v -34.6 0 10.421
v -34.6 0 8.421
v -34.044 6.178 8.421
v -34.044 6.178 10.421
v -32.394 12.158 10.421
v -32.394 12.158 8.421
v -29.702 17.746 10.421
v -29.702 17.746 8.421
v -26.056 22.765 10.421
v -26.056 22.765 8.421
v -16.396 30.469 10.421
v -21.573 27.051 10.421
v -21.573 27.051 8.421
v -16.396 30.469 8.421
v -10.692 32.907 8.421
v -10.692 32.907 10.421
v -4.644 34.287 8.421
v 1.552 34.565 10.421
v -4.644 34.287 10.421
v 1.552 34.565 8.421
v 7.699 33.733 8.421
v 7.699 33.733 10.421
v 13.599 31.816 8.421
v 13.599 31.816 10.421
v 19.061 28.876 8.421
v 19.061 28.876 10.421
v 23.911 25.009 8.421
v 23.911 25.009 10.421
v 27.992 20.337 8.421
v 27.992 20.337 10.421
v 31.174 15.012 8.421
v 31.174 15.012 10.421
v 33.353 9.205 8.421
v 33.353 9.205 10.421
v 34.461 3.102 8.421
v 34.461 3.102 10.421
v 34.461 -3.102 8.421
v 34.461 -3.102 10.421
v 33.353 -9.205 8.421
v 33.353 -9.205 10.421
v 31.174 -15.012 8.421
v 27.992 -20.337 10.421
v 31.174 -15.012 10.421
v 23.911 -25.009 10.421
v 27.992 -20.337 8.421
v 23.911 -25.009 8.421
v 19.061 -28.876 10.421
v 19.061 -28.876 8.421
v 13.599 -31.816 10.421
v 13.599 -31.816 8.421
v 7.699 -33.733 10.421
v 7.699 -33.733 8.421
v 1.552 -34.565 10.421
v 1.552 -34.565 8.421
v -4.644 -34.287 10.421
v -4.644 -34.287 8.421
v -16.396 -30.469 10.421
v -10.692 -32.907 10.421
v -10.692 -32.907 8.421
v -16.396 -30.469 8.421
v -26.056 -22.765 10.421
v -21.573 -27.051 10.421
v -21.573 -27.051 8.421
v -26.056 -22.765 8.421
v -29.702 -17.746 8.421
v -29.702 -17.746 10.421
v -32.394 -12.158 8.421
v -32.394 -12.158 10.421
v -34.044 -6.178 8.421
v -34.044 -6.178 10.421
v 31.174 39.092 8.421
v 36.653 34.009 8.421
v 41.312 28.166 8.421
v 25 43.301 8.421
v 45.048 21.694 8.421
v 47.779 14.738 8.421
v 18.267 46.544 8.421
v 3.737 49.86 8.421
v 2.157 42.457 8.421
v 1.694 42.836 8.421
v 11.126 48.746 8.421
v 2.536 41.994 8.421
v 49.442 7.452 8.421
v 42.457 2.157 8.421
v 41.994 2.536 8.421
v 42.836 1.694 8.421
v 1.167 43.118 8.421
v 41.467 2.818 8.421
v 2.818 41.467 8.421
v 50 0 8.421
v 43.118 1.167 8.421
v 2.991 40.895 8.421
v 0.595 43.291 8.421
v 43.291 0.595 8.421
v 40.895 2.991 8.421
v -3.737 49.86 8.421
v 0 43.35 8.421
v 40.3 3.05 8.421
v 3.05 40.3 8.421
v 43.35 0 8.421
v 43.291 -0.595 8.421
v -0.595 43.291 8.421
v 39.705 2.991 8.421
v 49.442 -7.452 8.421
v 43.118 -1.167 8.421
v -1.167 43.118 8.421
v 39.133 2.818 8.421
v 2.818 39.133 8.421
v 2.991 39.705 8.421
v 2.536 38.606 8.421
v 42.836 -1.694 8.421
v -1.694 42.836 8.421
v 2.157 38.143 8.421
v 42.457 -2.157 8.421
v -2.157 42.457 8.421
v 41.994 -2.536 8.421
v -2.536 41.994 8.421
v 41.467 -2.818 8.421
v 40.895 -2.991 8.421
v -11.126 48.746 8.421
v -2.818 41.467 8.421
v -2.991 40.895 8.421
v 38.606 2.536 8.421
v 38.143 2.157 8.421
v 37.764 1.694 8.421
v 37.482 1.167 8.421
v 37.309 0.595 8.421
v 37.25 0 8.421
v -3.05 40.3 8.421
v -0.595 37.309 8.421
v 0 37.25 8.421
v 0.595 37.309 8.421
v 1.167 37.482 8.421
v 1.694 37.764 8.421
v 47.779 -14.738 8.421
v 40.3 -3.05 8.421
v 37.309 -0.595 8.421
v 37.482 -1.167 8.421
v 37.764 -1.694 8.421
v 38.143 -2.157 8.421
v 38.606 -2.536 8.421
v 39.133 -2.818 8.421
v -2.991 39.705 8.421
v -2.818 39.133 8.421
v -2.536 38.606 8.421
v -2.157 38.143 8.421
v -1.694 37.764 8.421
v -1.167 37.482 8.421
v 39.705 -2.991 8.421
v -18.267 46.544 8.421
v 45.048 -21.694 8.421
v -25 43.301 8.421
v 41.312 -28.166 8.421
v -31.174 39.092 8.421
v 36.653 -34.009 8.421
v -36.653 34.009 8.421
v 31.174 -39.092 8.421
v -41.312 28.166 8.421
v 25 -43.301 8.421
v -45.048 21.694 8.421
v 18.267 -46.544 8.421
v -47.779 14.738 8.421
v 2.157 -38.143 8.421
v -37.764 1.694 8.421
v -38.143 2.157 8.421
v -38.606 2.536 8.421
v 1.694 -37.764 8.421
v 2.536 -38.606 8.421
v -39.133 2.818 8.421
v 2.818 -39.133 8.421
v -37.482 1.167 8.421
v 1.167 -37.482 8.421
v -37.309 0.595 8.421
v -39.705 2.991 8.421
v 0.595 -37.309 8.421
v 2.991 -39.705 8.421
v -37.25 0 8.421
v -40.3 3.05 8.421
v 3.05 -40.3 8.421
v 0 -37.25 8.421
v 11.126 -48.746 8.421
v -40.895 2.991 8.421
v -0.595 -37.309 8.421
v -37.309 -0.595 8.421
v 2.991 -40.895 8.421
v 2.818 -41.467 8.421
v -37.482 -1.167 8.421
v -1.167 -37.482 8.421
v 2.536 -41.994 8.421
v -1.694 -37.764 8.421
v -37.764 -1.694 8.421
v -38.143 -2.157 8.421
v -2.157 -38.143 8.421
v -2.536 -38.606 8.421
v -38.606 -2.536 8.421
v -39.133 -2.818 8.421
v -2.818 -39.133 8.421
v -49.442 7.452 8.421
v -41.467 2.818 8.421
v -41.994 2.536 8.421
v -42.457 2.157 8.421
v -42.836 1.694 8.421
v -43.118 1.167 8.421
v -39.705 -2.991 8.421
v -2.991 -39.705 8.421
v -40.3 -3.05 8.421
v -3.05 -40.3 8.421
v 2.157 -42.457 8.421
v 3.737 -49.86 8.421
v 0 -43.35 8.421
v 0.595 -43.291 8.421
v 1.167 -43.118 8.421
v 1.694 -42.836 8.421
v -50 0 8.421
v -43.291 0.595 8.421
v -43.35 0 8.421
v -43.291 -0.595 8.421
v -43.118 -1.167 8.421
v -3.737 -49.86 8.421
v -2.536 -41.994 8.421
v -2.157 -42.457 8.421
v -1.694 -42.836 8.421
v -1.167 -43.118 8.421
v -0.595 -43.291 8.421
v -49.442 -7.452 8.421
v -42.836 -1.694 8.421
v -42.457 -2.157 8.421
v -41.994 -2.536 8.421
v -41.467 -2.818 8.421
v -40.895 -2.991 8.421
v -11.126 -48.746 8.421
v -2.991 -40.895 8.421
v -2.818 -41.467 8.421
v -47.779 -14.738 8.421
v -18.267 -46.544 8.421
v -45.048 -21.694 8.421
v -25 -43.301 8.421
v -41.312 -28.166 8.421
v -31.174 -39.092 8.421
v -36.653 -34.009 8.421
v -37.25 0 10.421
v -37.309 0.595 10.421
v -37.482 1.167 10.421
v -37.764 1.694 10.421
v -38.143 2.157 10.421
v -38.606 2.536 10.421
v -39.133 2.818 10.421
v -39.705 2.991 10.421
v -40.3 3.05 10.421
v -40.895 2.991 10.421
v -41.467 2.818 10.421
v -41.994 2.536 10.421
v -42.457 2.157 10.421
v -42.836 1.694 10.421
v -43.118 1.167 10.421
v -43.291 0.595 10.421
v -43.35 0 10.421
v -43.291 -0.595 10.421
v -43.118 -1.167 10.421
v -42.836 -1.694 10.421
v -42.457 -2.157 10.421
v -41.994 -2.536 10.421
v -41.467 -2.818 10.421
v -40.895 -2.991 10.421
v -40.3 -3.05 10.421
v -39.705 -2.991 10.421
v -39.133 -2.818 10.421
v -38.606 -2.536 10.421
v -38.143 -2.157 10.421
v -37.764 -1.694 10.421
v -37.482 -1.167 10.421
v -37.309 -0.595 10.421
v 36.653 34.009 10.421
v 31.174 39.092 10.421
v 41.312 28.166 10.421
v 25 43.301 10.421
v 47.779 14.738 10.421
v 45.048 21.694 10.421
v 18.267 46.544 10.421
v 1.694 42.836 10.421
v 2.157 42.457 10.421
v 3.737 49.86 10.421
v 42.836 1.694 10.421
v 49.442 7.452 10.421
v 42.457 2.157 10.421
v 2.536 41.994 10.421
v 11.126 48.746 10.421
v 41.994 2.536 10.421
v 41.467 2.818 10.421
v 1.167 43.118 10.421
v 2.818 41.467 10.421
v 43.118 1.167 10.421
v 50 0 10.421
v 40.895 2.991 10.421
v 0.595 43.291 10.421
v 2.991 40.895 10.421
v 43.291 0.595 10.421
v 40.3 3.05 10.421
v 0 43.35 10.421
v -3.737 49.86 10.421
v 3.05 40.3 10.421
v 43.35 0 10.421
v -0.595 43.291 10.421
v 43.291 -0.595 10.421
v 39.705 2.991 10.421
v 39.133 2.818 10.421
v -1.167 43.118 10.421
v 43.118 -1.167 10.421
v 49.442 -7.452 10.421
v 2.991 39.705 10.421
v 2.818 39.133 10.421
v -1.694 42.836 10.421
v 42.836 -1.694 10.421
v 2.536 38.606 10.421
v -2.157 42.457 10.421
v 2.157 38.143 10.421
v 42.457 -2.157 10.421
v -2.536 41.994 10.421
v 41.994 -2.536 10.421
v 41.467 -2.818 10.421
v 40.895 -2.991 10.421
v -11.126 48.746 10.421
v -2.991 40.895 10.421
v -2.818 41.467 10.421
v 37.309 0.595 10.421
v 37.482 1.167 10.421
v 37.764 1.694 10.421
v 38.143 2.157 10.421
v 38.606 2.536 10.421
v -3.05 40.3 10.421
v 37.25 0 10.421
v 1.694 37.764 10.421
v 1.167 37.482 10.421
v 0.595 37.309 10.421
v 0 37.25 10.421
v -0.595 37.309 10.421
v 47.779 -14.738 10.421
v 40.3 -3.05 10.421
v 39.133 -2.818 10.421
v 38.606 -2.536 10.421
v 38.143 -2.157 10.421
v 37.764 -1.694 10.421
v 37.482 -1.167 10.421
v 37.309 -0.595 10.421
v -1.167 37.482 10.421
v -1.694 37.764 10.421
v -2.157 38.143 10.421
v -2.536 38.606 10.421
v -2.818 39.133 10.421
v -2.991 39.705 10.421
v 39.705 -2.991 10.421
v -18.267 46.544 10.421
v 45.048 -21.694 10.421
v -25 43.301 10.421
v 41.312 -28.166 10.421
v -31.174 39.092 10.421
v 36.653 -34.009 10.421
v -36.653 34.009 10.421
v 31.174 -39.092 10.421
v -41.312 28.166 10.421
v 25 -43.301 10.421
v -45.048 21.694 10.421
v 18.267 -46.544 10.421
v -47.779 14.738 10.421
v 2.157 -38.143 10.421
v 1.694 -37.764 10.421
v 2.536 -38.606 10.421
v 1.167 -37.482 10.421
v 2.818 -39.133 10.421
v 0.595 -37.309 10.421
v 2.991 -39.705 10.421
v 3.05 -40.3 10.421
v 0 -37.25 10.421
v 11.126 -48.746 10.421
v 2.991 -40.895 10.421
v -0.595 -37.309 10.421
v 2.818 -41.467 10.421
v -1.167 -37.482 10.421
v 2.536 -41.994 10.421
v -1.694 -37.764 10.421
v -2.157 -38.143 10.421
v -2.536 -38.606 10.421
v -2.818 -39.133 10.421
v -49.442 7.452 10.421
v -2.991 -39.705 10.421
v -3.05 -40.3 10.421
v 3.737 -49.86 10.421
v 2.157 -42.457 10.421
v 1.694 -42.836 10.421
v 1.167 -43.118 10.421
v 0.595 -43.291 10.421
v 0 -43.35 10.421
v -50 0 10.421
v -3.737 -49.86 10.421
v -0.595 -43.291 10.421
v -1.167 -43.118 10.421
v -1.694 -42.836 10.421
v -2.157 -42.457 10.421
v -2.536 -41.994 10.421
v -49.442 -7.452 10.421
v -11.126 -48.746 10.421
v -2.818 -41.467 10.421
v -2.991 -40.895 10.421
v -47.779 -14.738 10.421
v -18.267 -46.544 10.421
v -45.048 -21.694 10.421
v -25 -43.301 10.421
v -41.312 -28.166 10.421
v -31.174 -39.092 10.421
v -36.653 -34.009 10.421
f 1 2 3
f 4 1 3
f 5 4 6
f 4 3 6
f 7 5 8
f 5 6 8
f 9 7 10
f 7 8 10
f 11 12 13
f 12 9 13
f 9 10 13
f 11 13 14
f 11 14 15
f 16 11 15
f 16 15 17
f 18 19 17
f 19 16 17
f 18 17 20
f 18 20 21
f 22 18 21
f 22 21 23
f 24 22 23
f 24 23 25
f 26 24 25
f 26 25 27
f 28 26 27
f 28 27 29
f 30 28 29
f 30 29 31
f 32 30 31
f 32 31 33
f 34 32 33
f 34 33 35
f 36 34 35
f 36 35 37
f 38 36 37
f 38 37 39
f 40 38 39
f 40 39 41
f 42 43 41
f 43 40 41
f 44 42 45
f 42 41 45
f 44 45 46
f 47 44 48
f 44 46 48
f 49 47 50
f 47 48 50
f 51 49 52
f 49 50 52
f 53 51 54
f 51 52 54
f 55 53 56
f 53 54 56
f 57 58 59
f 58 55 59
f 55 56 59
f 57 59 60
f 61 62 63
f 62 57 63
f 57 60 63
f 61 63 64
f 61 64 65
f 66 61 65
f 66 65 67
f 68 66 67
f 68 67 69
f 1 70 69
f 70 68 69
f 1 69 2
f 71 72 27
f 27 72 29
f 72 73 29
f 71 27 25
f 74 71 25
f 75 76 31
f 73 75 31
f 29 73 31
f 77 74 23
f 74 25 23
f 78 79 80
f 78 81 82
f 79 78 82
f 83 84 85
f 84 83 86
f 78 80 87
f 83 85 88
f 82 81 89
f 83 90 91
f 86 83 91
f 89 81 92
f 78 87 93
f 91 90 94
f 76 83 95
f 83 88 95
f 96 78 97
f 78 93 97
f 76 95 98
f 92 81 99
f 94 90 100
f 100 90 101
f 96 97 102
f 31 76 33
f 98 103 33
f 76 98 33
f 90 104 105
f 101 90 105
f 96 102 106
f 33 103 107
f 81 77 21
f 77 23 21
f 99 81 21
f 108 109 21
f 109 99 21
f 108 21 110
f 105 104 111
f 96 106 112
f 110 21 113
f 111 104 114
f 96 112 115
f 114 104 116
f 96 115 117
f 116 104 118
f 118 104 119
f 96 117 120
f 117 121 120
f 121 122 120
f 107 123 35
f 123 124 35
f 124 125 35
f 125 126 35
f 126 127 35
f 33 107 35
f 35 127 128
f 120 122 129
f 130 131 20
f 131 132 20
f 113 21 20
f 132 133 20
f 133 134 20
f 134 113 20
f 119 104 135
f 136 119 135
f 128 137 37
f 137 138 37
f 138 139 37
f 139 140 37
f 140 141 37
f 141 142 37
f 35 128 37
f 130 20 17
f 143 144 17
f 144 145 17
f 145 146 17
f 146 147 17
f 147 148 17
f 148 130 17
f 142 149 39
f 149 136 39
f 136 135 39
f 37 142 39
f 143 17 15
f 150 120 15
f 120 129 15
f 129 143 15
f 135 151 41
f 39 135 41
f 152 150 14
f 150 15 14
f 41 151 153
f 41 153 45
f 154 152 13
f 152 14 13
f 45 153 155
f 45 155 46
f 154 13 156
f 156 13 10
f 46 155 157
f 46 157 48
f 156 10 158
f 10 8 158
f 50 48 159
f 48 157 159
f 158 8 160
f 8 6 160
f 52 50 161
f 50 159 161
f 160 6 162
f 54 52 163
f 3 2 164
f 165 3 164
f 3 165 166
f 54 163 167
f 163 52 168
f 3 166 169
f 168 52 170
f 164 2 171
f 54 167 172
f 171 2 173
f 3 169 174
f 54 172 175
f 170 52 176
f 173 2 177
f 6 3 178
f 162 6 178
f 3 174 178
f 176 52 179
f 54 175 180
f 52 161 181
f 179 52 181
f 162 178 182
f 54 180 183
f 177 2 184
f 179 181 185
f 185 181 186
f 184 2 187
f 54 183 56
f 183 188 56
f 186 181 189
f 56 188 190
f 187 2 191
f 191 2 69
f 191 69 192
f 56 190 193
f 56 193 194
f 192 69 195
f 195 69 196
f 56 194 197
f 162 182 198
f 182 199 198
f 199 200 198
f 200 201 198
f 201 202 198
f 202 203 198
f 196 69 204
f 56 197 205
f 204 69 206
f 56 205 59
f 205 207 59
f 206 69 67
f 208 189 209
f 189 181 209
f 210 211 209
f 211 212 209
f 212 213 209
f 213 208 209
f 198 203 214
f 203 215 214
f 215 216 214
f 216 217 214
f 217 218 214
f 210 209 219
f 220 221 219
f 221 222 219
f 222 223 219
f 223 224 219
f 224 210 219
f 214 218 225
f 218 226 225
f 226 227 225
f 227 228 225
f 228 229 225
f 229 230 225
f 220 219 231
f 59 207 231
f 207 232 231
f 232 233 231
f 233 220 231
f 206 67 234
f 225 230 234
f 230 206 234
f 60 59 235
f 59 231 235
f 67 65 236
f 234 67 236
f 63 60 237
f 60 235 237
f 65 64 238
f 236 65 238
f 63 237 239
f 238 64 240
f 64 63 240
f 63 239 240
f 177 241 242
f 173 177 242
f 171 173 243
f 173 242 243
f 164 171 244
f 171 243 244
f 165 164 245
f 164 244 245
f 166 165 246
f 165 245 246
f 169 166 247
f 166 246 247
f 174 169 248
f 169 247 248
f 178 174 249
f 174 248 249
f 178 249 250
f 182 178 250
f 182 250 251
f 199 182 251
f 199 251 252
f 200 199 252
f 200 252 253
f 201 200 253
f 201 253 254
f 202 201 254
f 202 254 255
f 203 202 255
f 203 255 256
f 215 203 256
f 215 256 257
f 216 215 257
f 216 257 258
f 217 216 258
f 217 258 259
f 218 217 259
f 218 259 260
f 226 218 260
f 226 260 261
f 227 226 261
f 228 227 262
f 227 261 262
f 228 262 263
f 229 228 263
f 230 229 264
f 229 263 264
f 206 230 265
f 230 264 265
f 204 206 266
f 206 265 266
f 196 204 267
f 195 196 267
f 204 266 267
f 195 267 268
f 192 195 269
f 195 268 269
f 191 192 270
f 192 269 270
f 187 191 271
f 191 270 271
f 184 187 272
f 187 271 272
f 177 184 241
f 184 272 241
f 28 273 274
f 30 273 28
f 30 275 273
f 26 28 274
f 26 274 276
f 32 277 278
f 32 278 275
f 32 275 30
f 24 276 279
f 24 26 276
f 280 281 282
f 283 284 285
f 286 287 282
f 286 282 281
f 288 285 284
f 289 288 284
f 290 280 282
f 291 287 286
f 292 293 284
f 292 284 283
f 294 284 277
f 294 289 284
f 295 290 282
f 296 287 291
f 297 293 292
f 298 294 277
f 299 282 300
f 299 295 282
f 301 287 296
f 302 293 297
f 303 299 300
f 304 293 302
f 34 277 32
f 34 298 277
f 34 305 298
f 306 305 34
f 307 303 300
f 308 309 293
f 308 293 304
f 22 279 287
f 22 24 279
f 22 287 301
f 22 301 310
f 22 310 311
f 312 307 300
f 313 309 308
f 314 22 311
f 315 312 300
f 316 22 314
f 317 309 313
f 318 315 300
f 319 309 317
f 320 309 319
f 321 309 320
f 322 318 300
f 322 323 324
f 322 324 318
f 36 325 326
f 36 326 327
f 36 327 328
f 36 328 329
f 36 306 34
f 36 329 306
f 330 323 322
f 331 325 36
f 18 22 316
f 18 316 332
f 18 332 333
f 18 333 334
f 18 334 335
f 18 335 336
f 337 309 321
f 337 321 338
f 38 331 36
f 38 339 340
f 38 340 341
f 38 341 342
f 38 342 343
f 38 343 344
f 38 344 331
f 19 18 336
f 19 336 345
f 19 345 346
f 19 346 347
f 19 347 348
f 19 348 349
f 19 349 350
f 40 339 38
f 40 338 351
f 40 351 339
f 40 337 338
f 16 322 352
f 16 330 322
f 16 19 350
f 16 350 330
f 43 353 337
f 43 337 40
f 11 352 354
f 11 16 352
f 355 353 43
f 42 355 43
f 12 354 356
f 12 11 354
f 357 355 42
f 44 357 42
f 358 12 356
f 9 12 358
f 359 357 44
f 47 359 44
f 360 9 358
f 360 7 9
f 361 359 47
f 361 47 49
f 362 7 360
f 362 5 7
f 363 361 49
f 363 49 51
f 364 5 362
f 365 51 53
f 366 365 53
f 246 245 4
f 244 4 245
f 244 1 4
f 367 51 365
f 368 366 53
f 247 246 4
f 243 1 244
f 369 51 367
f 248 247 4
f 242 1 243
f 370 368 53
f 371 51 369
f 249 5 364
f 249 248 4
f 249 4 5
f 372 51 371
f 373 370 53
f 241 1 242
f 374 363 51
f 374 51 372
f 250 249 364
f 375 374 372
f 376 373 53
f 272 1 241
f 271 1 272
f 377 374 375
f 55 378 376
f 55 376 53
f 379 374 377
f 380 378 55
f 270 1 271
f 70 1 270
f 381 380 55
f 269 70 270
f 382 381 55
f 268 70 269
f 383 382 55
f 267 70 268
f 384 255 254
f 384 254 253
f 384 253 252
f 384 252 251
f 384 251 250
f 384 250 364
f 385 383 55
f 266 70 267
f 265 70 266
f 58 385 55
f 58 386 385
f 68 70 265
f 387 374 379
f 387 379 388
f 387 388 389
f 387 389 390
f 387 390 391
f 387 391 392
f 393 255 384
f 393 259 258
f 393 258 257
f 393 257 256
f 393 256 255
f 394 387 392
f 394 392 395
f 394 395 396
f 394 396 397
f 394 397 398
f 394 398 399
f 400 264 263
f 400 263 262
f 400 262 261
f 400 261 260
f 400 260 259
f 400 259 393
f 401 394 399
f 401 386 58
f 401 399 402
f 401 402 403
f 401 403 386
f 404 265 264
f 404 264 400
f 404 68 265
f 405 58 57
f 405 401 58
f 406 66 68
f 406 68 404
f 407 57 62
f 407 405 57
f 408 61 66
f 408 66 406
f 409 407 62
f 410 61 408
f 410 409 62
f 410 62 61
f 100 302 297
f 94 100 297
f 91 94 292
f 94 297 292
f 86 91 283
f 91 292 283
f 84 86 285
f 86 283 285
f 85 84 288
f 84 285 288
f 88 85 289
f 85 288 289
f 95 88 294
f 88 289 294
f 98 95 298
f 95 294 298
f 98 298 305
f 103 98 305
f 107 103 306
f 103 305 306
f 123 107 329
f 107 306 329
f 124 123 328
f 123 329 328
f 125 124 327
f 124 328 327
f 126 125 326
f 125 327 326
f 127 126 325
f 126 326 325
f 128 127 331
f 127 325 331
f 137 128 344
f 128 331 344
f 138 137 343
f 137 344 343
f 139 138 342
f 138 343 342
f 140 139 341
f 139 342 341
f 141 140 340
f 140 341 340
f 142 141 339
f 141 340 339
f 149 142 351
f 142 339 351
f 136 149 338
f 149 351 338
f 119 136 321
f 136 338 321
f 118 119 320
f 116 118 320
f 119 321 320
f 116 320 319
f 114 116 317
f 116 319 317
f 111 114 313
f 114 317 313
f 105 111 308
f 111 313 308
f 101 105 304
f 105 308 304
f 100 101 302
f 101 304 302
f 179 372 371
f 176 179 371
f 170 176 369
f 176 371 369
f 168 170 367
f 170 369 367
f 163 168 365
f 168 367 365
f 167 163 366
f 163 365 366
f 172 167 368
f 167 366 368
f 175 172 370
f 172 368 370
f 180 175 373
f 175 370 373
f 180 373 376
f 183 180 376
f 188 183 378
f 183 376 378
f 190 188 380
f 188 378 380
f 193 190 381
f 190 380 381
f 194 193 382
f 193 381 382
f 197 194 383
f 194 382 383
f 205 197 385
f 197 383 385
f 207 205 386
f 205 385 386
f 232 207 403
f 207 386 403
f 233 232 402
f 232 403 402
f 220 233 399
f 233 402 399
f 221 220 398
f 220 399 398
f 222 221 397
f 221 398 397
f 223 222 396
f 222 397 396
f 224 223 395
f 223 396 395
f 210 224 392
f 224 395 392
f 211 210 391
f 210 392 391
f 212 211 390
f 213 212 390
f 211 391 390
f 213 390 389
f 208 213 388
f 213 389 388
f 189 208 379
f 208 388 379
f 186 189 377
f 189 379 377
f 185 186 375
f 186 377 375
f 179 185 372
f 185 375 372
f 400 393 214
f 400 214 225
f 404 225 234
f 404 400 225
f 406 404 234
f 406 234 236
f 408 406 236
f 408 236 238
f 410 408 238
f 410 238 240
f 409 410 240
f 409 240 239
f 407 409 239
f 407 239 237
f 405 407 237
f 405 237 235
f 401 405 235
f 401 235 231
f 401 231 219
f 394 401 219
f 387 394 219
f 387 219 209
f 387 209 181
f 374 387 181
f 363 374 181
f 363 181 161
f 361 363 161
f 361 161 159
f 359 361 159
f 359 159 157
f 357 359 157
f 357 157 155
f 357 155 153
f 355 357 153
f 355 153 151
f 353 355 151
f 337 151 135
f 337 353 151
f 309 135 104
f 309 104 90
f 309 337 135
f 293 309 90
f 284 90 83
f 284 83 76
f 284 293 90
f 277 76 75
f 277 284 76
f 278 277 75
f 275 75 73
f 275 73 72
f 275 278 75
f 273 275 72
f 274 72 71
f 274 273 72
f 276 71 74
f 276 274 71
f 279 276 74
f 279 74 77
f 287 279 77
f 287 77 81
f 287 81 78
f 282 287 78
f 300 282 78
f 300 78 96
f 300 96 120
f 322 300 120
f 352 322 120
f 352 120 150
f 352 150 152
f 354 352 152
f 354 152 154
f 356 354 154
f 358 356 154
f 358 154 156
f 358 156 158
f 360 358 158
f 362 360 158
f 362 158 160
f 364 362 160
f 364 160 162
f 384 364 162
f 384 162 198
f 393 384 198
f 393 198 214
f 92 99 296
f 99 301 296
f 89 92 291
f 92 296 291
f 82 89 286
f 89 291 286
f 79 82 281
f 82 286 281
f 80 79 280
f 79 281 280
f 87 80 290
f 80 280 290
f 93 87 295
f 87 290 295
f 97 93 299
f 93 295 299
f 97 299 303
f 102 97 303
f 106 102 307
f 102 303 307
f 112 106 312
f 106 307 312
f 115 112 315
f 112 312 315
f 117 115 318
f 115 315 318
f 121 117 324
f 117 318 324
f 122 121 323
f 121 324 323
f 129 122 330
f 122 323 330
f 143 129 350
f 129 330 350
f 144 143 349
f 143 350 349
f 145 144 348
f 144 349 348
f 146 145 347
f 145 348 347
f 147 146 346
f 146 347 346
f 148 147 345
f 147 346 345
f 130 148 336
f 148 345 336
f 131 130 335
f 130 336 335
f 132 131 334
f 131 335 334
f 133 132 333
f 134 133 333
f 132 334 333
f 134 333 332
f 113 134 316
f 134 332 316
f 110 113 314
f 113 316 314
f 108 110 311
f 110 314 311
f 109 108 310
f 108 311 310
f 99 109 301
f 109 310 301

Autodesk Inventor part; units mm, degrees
ref_plane "YZ Plane" through (0, 0, 0) normal (1, 0, 0) x (0, 1, 0)
ref_plane "XZ Plane" through (0, 0, 0) normal (0, 1, 0) x (-1, 0, 0)
ref_plane "XY Plane" through (0, 0, 0) normal (0, 0, 1) x (1, 0, 0)
sketch "Szkic1" plane through (0, 0, 0) normal (0, 1, 0) x (-1, 0, 0)
  line L0 (34.6, 10.4209) -> (34.6, 8.4209)
  line L1 (34.6, 8.4209) -> (50, 8.4209)
  line L2 (50, 8.4209) -> (50, 10.4209)
  line L3 (50, 10.4209) -> (34.6, 10.4209)
  line L4 (0, 0) -> (0, 76.2035)
  dimension "d0" = 15.4
  dimension "d1" = 2
  dimension "d2" = 34.6
revolve "Obrót1" add sketch "Szkic1" angle 360 about axis through (0, 0, 0) along (0, 0, 1)
sketch "Szkic2" plane through (0, 0, 10.4209) normal (0, 0, 1) x (1, 0, 0)
  circle A0 centre (0, 0) radius 40.3
  circle A1 centre (0, 40.3) radius 3.05
  dimension "d4" = 80.6
  dimension "d5" = 6.1
extrude "Wyciągnięcie proste1" cut sketch "Szkic2" against normal blind 10 contours A1 A0 | A0 A1 picked at (-0.1196, 39.2818) picked at (0.1049, 41.3027)
sketch "Szkic3" plane through (0, 0, 10.4209) normal (0, 0, 1) x (1, 0, 0)
  circle A0 centre (0, 0) radius 40.3
  circle A1 centre (40.3, 0) radius 3.05
  circle A2 centre (0, -40.3) radius 3.05
  circle A3 centre (-40.3, 0) radius 3.05
  dimension "d8" = 80.6
  dimension "d9" = 6.1
  dimension "d10" = 6.1
  dimension "d11" = 6.1
extrude "Wyciągnięcie proste2" cut sketch "Szkic3" against normal blind 10 contours A0 A1 | A0 A1 | A3 A0 | A0 A3 | A2 A0 | A0 A2
properties part number "uszczelka" material "Poliwęglan dymiony"
